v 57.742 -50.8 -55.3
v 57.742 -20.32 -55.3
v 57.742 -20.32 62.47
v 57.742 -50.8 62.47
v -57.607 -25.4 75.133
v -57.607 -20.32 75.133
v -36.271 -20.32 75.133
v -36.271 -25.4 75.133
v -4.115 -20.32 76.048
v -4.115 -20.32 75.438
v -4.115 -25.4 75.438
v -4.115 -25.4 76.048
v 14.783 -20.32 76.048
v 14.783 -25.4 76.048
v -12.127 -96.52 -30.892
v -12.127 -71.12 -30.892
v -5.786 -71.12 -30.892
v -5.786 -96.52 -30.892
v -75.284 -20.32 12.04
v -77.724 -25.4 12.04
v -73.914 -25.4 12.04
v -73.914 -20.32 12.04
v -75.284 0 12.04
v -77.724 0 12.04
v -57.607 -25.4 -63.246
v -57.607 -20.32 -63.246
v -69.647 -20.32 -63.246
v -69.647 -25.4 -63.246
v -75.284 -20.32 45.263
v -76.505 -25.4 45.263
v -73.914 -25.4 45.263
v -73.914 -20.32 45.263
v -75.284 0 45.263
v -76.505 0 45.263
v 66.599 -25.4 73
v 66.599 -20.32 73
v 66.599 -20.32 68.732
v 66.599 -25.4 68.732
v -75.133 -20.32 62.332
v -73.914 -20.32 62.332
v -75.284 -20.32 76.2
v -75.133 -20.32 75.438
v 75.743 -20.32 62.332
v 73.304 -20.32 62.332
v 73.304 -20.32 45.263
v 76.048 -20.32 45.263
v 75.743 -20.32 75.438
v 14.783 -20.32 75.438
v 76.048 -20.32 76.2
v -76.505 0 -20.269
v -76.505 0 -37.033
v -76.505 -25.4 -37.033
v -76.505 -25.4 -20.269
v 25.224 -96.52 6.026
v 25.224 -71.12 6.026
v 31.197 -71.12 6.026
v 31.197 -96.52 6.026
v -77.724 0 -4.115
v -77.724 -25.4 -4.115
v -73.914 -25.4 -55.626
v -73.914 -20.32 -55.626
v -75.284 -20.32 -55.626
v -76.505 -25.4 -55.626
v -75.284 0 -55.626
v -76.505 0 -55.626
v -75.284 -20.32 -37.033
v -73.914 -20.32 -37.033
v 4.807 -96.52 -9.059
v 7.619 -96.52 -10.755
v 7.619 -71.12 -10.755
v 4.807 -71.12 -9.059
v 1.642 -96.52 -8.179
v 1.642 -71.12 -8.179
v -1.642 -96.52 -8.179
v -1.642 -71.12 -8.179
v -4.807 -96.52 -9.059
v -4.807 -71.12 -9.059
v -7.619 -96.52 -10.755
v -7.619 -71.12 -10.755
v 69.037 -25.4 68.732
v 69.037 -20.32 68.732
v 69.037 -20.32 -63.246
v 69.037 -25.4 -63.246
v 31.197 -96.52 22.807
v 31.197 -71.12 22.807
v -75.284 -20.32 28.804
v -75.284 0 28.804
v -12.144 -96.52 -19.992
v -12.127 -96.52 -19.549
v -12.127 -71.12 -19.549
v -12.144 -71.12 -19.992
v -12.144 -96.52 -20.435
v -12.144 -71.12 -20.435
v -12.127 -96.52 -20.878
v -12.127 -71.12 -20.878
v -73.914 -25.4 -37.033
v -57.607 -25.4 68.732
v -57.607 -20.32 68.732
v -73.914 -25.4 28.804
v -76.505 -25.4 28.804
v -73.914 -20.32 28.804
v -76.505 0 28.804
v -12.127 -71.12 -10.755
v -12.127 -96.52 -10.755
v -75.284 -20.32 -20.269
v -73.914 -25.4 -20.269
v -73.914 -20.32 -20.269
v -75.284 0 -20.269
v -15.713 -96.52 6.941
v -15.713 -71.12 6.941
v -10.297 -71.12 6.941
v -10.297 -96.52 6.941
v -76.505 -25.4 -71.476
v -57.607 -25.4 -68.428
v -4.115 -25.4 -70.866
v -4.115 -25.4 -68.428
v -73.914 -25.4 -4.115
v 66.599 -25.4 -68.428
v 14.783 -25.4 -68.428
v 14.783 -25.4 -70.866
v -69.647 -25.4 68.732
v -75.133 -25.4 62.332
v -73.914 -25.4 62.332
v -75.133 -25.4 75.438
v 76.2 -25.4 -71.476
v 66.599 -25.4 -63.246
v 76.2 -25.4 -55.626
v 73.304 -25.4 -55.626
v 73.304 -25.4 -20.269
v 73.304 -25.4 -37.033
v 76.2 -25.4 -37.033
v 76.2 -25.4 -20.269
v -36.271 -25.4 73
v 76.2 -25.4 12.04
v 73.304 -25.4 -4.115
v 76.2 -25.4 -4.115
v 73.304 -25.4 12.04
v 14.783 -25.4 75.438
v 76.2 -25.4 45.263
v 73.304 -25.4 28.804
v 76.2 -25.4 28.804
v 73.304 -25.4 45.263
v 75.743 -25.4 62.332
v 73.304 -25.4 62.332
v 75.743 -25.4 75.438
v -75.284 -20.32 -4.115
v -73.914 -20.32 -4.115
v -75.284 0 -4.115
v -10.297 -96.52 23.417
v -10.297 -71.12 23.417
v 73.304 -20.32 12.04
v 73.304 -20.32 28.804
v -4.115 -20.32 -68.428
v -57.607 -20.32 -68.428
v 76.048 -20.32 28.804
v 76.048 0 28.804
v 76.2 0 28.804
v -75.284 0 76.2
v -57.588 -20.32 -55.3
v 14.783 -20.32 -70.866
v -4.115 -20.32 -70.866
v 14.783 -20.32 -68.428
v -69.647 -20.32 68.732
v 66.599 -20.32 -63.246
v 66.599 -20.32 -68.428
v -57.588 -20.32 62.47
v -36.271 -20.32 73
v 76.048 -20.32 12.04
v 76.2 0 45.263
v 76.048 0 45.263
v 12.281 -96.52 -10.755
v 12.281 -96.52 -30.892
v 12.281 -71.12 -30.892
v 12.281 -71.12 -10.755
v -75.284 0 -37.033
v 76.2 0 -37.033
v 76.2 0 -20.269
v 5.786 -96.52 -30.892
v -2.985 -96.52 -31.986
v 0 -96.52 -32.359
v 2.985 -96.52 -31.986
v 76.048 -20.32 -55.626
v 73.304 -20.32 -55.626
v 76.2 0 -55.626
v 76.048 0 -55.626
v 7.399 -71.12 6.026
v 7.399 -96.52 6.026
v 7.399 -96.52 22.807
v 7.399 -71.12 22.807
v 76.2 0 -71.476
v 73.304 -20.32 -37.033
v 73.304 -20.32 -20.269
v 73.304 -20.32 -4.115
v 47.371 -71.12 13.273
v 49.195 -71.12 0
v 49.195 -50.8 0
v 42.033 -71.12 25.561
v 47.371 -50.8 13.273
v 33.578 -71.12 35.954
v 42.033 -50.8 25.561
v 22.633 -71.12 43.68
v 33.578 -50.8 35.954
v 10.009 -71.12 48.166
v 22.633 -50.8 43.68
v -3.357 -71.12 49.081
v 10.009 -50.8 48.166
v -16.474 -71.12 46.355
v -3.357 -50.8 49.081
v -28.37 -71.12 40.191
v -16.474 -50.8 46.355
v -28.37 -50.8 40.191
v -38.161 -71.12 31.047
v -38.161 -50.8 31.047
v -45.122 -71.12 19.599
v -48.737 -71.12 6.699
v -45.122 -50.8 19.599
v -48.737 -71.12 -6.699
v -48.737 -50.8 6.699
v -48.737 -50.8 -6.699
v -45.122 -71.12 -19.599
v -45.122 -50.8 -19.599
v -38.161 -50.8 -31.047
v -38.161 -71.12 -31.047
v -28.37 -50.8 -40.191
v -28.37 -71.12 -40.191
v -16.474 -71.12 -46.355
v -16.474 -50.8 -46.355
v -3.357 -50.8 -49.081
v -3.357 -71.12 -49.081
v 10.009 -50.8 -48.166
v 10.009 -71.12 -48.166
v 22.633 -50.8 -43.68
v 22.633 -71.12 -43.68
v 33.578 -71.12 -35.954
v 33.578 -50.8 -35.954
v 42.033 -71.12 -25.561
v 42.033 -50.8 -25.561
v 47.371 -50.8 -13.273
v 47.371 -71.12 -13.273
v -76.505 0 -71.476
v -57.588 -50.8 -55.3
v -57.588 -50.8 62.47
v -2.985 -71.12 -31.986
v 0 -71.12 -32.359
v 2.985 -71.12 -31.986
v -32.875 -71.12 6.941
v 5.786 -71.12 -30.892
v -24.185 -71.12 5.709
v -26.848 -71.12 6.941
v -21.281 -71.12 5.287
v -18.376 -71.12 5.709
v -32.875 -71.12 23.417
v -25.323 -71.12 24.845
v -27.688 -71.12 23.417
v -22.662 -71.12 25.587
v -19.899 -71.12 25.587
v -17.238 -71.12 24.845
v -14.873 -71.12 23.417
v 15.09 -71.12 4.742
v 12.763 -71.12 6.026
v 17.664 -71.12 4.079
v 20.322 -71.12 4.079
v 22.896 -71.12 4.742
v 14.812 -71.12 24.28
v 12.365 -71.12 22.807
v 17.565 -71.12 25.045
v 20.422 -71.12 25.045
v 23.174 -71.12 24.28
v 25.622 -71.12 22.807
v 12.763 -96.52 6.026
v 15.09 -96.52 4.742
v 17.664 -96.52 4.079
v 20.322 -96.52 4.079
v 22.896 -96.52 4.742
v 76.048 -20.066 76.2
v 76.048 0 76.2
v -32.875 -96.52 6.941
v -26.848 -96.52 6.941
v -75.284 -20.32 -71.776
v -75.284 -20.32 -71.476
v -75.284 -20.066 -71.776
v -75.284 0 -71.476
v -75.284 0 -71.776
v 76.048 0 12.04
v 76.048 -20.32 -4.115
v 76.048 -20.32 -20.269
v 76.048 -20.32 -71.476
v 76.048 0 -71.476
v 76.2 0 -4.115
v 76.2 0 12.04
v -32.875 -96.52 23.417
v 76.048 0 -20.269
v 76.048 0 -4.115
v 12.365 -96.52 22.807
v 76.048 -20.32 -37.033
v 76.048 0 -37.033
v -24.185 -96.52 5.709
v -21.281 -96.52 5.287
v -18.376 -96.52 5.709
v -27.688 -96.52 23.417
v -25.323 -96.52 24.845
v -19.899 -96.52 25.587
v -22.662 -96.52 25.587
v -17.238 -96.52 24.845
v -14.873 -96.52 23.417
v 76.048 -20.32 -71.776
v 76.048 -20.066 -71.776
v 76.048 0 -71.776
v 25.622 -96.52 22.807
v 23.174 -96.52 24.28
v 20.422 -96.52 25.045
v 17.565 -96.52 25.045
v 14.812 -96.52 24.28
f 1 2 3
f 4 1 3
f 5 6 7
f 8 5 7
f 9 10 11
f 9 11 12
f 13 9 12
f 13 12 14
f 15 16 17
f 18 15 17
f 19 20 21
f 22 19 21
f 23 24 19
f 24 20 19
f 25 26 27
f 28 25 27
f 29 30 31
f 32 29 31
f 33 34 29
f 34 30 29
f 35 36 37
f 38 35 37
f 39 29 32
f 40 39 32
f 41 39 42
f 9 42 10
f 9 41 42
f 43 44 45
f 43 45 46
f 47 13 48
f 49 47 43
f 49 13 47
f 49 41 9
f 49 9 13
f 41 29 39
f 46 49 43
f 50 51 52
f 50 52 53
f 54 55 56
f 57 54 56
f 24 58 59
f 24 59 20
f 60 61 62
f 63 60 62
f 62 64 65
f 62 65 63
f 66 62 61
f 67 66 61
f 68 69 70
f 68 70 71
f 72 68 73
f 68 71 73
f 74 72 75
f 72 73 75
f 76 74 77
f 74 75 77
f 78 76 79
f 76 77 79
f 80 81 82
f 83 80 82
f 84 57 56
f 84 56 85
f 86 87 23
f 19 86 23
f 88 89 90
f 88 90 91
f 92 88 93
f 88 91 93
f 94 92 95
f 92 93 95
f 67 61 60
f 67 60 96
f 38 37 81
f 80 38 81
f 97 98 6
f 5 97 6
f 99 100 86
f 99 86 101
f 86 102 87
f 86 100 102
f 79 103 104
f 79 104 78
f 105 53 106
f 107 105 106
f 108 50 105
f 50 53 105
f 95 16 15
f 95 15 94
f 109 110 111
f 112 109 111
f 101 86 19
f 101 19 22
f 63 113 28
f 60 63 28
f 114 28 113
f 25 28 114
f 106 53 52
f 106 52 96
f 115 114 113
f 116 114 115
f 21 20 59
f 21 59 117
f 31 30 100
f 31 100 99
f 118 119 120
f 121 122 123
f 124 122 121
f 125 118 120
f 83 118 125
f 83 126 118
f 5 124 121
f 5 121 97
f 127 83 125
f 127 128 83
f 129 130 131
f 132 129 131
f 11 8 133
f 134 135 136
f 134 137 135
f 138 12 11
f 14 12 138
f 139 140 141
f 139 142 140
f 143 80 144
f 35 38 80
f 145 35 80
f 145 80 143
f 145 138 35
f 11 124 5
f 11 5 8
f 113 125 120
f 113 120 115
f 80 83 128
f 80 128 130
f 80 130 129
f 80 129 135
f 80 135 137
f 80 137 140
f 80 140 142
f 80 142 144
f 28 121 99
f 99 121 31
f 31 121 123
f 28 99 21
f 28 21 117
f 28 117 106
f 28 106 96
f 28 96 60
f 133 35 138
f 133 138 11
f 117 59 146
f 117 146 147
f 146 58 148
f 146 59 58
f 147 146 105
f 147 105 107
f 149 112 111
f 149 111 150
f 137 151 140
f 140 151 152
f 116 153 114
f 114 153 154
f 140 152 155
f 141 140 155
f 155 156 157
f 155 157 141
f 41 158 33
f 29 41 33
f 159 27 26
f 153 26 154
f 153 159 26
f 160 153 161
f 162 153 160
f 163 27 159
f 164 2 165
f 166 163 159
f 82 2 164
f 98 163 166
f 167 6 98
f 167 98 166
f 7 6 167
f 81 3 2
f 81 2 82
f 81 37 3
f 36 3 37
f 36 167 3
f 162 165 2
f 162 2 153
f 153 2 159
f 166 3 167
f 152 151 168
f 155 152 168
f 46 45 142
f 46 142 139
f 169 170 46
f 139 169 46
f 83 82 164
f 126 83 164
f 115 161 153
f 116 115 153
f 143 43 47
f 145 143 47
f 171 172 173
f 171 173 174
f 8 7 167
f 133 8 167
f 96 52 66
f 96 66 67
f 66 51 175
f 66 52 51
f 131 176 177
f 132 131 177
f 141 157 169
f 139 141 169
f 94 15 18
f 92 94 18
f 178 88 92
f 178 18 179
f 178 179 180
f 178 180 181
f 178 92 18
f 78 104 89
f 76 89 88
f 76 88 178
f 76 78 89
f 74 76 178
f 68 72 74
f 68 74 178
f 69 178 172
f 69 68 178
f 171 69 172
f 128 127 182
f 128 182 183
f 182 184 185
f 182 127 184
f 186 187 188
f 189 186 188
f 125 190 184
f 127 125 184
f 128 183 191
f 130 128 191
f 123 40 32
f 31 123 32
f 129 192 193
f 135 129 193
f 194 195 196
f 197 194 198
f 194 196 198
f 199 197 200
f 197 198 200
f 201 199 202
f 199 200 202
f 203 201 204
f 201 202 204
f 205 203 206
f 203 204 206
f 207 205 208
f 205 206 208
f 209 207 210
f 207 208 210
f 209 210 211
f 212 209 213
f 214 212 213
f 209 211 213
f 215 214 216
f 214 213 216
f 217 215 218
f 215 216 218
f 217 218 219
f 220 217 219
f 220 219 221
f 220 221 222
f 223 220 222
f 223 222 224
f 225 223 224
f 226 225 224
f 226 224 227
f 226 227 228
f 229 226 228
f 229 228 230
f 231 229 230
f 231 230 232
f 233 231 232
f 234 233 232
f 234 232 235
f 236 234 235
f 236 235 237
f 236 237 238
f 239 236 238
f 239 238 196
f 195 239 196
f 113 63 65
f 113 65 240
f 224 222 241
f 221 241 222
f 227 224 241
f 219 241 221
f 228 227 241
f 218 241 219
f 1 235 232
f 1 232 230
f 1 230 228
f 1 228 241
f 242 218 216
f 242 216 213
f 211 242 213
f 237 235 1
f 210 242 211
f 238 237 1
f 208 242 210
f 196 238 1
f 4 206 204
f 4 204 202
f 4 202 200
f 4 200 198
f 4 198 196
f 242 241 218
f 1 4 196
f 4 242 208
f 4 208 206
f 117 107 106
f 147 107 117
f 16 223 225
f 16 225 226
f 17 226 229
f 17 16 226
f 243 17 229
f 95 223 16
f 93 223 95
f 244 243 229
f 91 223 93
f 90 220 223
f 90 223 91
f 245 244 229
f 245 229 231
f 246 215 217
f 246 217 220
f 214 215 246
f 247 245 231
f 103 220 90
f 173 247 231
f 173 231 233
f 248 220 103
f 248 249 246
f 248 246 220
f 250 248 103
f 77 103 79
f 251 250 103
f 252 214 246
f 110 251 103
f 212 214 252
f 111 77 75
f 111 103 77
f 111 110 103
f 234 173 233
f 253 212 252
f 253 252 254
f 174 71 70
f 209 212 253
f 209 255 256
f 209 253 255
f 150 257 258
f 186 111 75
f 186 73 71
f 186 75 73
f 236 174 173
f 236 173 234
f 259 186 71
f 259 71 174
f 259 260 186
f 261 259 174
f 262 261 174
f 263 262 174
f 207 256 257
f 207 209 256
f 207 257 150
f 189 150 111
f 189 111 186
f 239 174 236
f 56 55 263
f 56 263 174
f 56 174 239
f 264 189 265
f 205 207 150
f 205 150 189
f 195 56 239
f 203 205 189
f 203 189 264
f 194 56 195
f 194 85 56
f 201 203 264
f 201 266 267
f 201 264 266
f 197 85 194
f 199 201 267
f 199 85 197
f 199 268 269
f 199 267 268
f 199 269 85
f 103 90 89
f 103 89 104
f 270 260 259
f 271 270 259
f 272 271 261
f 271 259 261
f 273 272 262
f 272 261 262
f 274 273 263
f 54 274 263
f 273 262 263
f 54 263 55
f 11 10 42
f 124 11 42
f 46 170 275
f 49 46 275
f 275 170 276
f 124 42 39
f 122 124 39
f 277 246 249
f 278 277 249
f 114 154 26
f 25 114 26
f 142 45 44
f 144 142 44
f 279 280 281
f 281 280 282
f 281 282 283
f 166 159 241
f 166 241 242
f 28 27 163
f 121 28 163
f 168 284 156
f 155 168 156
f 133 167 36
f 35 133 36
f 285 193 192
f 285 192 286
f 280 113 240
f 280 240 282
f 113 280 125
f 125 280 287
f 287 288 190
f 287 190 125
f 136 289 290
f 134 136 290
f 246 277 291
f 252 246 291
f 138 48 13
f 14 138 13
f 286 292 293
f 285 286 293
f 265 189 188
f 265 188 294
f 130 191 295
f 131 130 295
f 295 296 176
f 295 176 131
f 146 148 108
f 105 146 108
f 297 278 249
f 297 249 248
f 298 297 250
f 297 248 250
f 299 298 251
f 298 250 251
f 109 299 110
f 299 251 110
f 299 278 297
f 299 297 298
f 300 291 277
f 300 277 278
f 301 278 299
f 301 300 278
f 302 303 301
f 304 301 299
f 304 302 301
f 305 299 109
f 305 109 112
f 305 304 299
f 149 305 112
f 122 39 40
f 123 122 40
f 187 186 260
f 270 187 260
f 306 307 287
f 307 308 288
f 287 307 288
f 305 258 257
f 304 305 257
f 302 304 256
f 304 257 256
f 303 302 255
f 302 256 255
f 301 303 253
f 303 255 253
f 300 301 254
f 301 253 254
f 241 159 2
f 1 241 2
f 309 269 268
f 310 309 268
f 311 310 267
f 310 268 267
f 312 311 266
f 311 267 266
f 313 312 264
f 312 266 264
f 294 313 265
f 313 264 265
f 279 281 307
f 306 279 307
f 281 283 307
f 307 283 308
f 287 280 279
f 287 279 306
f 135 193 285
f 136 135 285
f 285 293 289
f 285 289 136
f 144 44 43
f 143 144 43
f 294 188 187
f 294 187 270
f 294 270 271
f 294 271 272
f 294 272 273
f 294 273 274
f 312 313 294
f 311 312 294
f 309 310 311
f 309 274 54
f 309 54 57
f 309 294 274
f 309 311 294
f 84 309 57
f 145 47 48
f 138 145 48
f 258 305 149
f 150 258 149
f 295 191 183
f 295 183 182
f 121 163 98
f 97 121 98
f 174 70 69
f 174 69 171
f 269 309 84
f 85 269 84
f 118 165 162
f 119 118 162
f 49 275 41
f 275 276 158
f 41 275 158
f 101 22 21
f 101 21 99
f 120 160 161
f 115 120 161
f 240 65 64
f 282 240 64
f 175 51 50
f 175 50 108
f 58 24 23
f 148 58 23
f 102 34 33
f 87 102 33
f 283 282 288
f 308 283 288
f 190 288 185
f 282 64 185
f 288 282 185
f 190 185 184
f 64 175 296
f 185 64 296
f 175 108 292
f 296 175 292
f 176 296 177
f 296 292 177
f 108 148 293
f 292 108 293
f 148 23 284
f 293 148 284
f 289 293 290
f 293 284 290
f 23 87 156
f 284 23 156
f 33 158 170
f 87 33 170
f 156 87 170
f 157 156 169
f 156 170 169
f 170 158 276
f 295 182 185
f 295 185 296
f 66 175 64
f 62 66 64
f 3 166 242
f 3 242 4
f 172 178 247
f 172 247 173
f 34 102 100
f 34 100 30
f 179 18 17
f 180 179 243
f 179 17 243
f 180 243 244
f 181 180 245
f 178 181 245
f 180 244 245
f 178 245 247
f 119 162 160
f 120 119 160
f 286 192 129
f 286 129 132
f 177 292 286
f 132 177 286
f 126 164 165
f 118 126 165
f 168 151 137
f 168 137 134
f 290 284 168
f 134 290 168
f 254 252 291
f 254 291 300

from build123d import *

# Parameters (mm, degrees)
F1_W      = 151.3319835067
F1_H      = 147.9758322239
F2_DEPTH  = 20.066
F3_W      = 75.2840787172
F3_H      = 76.1998519301
F3_H_2    = 71.7759802938
F3_W_2    = 76.0479047894
F4_DEPTH  = 0.254
F5_R      = 49.1952148829
F6_DEPTH  = 25.4
F7_R      = 49.1952148829
F8_DEPTH  = 25.4
F10_R     = 3.1853850864
F10_R_2   = 3.4787314223
F10_R_3   = 3.5581054838
F10_R_4   = 2.8783548202
F10_R_5   = 2.4598319218
F10_R_6   = 3.3699911713
F10_R_7   = 3.478728155
F10_R_8   = 3.1114703305
F10_R_9   = 3.1412466135
F10_R_10  = 3.2433066159
F10_R_11  = 3.5711592921
F10_R_12  = 2.6246103999
F10_R_13  = 3.3699920988
F10_R_14  = 3.4787300337
F10_R_15  = 3.4787284
F10_R_16  = 3.4111759436
F10_R_17  = 2.7289404217
F10_R_18  = 3.3002128489
F10_R_19  = 4.0130328481
F10_R_20  = 3.4787270114
F11_DEPTH = 25.4
F0_W      = 2.5908052921
F0_H      = 16.4592005312
F0_W_2    = 4.267193377
F0_H_2    = 17.0687958598
F0_H_3    = 16.7640019208
F0_W_3    = 3.8100033998
F0_H_4    = 16.154400073
F0_W_4    = 18.8976023346
F0_H_5    = 2.438403666
F0_H_6    = 0.6095990539
F0_H_7    = 16.7640000582
F0_W_5    = 34.7471982241
F0_H_8    = 18.592800945
F0_W_6    = 17.0688033104
F0_W_7    = 4.2672008276
F0_W_8    = 21.3360004127
F0_H_9    = 3.0480027199
F0_W_9    = 2.8956010938
F12_DEPTH = 25.4
F13_W     = 115.3296120465
F13_H     = 117.7704520524
F14_DEPTH = 50.8
F15_R     = 10.1970754687
F15_R_2   = 10.573540908
F15_R_3   = 12.1455637772
F16_DEPTH = 25.4
F17_W     = 22.5777532905
F17_H     = 16.4756593294
F17_W_2   = 23.7981723621
F17_H_2   = 16.7807638645
F17_W_3   = 24.4083832949
F17_H_3   = 20.1369160786
F18_DEPTH = 25.4


with BuildPart() as f2:
    # F1 (on Front) → F2 (new body)
    with BuildSketch(Plane.XZ):
        with Locations((0.3819130361, 2.2119358182)):
            Rectangle(F1_W, F1_H)
    extrude(amount=F2_DEPTH)

    # F3 (on face) → F4 (join)
    with BuildSketch(Plane.XZ.offset(20.066)):
        with Locations((-37.6420393586, 38.0999259651)):
            Rectangle(F3_W, F3_H)
        with Locations((-37.6420393586, -35.8879901469)):
            Rectangle(F3_W, F3_H_2)
        with Locations((38.0239523947, -35.8879901469)):
            Rectangle(F3_W_2, F3_H_2)
        with Locations((38.0239523947, 38.0999259651)):
            Rectangle(F3_W_2, F3_H)
    extrude(amount=F4_DEPTH)

    # F5 (on face) → F6 (join)
    with BuildSketch(Plane.XZ.offset(20.32)):
        Circle(F5_R)
    extrude(amount=F6_DEPTH)

    # F7 (on face) → F8 (join)
    with BuildSketch(Plane.XZ.offset(45.72)):
        Circle(F7_R)
    extrude(amount=F8_DEPTH)

    # F10 (on Front) → F11 (join)
    with BuildSketch(Plane.XZ):
        with Locations((45.2323183417, 56.9782480597)):
            Circle(F10_R)
        with Locations((18.0779919028, 56.6731393337)):
            Circle(F10_R_2)
        with Locations((-8.771231398, 56.6731393337)):
            Circle(F10_R_3)
        with Locations((-31.6540896893, 56.6731393337)):
            Circle(F10_R_4)
        with Locations((-49.3501722813, 56.6731393337)):
            Circle(F10_R_5)
        with Locations((45.8425283432, 20.0605653226)):
            Circle(F10_R_6)
        with Locations((18.0779919028, 19.1452521831)):
            Circle(F10_R_7)
        with Locations((-8.1610223278, 20.0605653226)):
            Circle(F10_R_8)
        with Locations((-28.9081465453, 19.1452521831)):
            Circle(F10_R_9)
        with Locations((-52.4012185633, 18.2299371809)):
            Circle(F10_R_10)
        with Locations((46.4527383447, -12.8907542676)):
            Circle(F10_R_11)
        with Locations((19.6035150439, -12.5856492668)):
            Circle(F10_R_12)
        with Locations((-8.4661273286, -12.5856492668)):
            Circle(F10_R_13)
        with Locations((-31.0438796878, -13.1958574057)):
            Circle(F10_R_14)
        with Locations((-52.4012185633, -12.2805442661)):
            Circle(F10_R_15)
        with Locations((46.4527383447, -45.8420701325)):
            Circle(F10_R_16)
        with Locations((20.5188300461, -45.536968857)):
            Circle(F10_R_17)
        with Locations((-10.2967554703, -46.75738886)):
            Circle(F10_R_18)
        with Locations((-31.6540896893, -47.0624901354)):
            Circle(F10_R_19)
        with Locations((-52.4012185633, -47.3675951362)):
            Circle(F10_R_20)
    extrude(amount=F11_DEPTH)

    # F0 (on Front) → F12 (join)
    with BuildSketch(Plane.XZ):
        with Locations((-75.2094015479, 37.0332021266)):
            Rectangle(F0_W, F0_H)
        with Locations((-71.7804022133, 53.7972003222)):
            Rectangle(F0_W_2, F0_H_2)
        with Locations((-71.7804022133, 37.0332021266)):
            Rectangle(F0_W_2, F0_H)
        Polygon((-73.9139989018, 72.9995965958), (-73.9139989018, 62.3315982521), (-69.6468055248, 62.3315982521), (-69.6468055248, 68.7323957682), (-57.6071999967, 68.7323957682), (-57.6071999967, 72.9995965958), align=None)
        Polygon((-75.1331970096, 62.3315982521), (-73.9139989018, 62.3315982521), (-73.9139989018, 72.9995965958), (-57.6071999967, 72.9995965958), (-57.6071999967, 75.1332044601), (-36.271199584, 75.1332044601), (-36.271199584, 72.9995965958), (-4.1148010641, 72.9995965958), (-4.1148010641, 75.4380002618), (-75.1331970096, 75.4380002618), align=None)
        with Locations((-71.7804022133, 20.4216009006)):
            Rectangle(F0_W_2, F0_H_3)
        with Locations((-75.8190006018, 3.9623999037)):
            Rectangle(F0_W_3, F0_H_4)
        with Locations((-71.7804022133, 3.9623999037)):
            Rectangle(F0_W_2, F0_H_4)
        with Locations((-71.7804022133, -12.1920001693)):
            Rectangle(F0_W_2, F0_H_4)
        with Locations((5.3340001032, 74.2187984288)):
            Rectangle(F0_W_4, F0_H_5)
        with Locations((5.3340001032, 75.7427997887)):
            Rectangle(F0_W_4, F0_H_6)
        with Locations((-75.2094015479, -28.6512002349)):
            Rectangle(F0_W, F0_H_7)
        with Locations((-71.7804022133, -28.6512002349)):
            Rectangle(F0_W_2, F0_H_7)
        with Locations((32.1564003825, 74.2187984288)):
            Rectangle(F0_W_5, F0_H_5)
        with Locations((-71.7804022133, -46.3296007365)):
            Rectangle(F0_W_2, F0_H_8)
        with Locations((58.0644011497, 74.2187984288)):
            Rectangle(F0_W_6, F0_H_5)
        Polygon((-73.9139989018, -68.4275999665), (-73.9139989018, -55.626001209), (-76.504804194, -55.626001209), (-76.504804194, -71.4756026864), (-57.6071999967, -71.4756026864), (-57.6071999967, -68.4275999665), align=None)
        Polygon((-69.6468055248, -55.626001209), (-73.9139989018, -55.626001209), (-73.9139989018, -68.4275999665), (-57.6071999967, -68.4275999665), (-57.6071999967, -63.2460042834), (-69.6468055248, -63.2460042834), align=None)
        Polygon((75.7427960634, 75.4380002618), (66.5988028049, 75.4380002618), (66.5988028049, 72.9995965958), (73.304399848, 72.9995965958), (73.304399848, 62.3315982521), (75.7427960634, 62.3315982521), align=None)
        with Locations((71.1707994342, 53.7972003222)):
            Rectangle(F0_W_7, F0_H_2)
        with Locations((71.1707994342, 37.0332021266)):
            Rectangle(F0_W_7, F0_H)
        Polygon((73.304399848, 72.9995965958), (66.5988028049, 72.9995965958), (66.5988028049, 68.7323957682), (69.0371990204, 68.7323957682), (69.0371990204, 62.3315982521), (73.304399848, 62.3315982521), align=None)
        with Locations((-46.9391997904, -69.9516013265)):
            Rectangle(F0_W_8, F0_H_9)
        with Locations((74.7522003949, 37.0332021266)):
            Rectangle(F0_W_9, F0_H)
        with Locations((71.1707994342, 20.4216009006)):
            Rectangle(F0_W_7, F0_H_3)
        Polygon((-4.1148010641, -68.4275999665), (-36.271199584, -68.4275999665), (-36.271199584, -71.4756026864), (49.5299994946, -71.4756026864), (49.5299994946, -68.4275999665), (14.7828012705, -68.4275999665), (14.7828012705, -70.8660036325), (-4.1148010641, -70.8660036325), align=None)
        with Locations((71.1707994342, 3.9623999037)):
            Rectangle(F0_W_7, F0_H_4)
        with Locations((74.7522003949, 3.9623999037)):
            Rectangle(F0_W_9, F0_H_4)
        with Locations((71.1707994342, -12.1920001693)):
            Rectangle(F0_W_7, F0_H_4)
        with Locations((58.0644011497, -69.9516013265)):
            Rectangle(F0_W_6, F0_H_9)
        with Locations((71.1707994342, -28.6512002349)):
            Rectangle(F0_W_7, F0_H_7)
        Polygon((66.5988028049, -68.4275999665), (66.5988028049, -71.4756026864), (76.2000009418, -71.4756026864), (76.2000009418, -55.626001209), (73.304399848, -55.626001209), (73.304399848, -68.4275999665), align=None)
        with Locations((74.7522003949, -28.6512002349)):
            Rectangle(F0_W_9, F0_H_7)
        with Locations((71.1707994342, -46.3296007365)):
            Rectangle(F0_W_7, F0_H_8)
        Polygon((66.5988028049, -63.2460042834), (66.5988028049, -68.4275999665), (73.304399848, -68.4275999665), (73.304399848, -55.626001209), (69.0371990204, -55.626001209), (69.0371990204, -63.2460042834), align=None)
    extrude(amount=F12_DEPTH)

    # F13 (on Front) → F14 (join)
    with BuildSketch(Plane.XZ):
        with Locations((0.0768061727, 3.5849083215)):
            Rectangle(F13_W, F13_H)
    extrude(amount=F14_DEPTH)

    # F15 (on face) → F16 (join)
    with BuildSketch(Plane.XZ.offset(71.12)):
        with Locations((-21.2805289775, 15.4839931056)):
            Circle(F15_R)
        with Locations((18.993306905, 14.5686790347)):
            Circle(F15_R_2)
        with Locations((0, -20.2132686973)):
            Circle(F15_R_3)
    extrude(amount=F16_DEPTH)

    # F17 (on face) → F18 (join)
    with BuildSketch(Plane.XZ.offset(71.12)):
        with Locations((-21.5856330469, 15.1788888033)):
            Rectangle(F17_W, F17_H)
        with Locations((19.2984095775, 14.4161265343)):
            Rectangle(F17_W_2, F17_H_2)
        with Locations((0.0768071041, -20.8234782331)):
            Rectangle(F17_W_3, F17_H_3)
    extrude(amount=F18_DEPTH)


solid = f2.part
